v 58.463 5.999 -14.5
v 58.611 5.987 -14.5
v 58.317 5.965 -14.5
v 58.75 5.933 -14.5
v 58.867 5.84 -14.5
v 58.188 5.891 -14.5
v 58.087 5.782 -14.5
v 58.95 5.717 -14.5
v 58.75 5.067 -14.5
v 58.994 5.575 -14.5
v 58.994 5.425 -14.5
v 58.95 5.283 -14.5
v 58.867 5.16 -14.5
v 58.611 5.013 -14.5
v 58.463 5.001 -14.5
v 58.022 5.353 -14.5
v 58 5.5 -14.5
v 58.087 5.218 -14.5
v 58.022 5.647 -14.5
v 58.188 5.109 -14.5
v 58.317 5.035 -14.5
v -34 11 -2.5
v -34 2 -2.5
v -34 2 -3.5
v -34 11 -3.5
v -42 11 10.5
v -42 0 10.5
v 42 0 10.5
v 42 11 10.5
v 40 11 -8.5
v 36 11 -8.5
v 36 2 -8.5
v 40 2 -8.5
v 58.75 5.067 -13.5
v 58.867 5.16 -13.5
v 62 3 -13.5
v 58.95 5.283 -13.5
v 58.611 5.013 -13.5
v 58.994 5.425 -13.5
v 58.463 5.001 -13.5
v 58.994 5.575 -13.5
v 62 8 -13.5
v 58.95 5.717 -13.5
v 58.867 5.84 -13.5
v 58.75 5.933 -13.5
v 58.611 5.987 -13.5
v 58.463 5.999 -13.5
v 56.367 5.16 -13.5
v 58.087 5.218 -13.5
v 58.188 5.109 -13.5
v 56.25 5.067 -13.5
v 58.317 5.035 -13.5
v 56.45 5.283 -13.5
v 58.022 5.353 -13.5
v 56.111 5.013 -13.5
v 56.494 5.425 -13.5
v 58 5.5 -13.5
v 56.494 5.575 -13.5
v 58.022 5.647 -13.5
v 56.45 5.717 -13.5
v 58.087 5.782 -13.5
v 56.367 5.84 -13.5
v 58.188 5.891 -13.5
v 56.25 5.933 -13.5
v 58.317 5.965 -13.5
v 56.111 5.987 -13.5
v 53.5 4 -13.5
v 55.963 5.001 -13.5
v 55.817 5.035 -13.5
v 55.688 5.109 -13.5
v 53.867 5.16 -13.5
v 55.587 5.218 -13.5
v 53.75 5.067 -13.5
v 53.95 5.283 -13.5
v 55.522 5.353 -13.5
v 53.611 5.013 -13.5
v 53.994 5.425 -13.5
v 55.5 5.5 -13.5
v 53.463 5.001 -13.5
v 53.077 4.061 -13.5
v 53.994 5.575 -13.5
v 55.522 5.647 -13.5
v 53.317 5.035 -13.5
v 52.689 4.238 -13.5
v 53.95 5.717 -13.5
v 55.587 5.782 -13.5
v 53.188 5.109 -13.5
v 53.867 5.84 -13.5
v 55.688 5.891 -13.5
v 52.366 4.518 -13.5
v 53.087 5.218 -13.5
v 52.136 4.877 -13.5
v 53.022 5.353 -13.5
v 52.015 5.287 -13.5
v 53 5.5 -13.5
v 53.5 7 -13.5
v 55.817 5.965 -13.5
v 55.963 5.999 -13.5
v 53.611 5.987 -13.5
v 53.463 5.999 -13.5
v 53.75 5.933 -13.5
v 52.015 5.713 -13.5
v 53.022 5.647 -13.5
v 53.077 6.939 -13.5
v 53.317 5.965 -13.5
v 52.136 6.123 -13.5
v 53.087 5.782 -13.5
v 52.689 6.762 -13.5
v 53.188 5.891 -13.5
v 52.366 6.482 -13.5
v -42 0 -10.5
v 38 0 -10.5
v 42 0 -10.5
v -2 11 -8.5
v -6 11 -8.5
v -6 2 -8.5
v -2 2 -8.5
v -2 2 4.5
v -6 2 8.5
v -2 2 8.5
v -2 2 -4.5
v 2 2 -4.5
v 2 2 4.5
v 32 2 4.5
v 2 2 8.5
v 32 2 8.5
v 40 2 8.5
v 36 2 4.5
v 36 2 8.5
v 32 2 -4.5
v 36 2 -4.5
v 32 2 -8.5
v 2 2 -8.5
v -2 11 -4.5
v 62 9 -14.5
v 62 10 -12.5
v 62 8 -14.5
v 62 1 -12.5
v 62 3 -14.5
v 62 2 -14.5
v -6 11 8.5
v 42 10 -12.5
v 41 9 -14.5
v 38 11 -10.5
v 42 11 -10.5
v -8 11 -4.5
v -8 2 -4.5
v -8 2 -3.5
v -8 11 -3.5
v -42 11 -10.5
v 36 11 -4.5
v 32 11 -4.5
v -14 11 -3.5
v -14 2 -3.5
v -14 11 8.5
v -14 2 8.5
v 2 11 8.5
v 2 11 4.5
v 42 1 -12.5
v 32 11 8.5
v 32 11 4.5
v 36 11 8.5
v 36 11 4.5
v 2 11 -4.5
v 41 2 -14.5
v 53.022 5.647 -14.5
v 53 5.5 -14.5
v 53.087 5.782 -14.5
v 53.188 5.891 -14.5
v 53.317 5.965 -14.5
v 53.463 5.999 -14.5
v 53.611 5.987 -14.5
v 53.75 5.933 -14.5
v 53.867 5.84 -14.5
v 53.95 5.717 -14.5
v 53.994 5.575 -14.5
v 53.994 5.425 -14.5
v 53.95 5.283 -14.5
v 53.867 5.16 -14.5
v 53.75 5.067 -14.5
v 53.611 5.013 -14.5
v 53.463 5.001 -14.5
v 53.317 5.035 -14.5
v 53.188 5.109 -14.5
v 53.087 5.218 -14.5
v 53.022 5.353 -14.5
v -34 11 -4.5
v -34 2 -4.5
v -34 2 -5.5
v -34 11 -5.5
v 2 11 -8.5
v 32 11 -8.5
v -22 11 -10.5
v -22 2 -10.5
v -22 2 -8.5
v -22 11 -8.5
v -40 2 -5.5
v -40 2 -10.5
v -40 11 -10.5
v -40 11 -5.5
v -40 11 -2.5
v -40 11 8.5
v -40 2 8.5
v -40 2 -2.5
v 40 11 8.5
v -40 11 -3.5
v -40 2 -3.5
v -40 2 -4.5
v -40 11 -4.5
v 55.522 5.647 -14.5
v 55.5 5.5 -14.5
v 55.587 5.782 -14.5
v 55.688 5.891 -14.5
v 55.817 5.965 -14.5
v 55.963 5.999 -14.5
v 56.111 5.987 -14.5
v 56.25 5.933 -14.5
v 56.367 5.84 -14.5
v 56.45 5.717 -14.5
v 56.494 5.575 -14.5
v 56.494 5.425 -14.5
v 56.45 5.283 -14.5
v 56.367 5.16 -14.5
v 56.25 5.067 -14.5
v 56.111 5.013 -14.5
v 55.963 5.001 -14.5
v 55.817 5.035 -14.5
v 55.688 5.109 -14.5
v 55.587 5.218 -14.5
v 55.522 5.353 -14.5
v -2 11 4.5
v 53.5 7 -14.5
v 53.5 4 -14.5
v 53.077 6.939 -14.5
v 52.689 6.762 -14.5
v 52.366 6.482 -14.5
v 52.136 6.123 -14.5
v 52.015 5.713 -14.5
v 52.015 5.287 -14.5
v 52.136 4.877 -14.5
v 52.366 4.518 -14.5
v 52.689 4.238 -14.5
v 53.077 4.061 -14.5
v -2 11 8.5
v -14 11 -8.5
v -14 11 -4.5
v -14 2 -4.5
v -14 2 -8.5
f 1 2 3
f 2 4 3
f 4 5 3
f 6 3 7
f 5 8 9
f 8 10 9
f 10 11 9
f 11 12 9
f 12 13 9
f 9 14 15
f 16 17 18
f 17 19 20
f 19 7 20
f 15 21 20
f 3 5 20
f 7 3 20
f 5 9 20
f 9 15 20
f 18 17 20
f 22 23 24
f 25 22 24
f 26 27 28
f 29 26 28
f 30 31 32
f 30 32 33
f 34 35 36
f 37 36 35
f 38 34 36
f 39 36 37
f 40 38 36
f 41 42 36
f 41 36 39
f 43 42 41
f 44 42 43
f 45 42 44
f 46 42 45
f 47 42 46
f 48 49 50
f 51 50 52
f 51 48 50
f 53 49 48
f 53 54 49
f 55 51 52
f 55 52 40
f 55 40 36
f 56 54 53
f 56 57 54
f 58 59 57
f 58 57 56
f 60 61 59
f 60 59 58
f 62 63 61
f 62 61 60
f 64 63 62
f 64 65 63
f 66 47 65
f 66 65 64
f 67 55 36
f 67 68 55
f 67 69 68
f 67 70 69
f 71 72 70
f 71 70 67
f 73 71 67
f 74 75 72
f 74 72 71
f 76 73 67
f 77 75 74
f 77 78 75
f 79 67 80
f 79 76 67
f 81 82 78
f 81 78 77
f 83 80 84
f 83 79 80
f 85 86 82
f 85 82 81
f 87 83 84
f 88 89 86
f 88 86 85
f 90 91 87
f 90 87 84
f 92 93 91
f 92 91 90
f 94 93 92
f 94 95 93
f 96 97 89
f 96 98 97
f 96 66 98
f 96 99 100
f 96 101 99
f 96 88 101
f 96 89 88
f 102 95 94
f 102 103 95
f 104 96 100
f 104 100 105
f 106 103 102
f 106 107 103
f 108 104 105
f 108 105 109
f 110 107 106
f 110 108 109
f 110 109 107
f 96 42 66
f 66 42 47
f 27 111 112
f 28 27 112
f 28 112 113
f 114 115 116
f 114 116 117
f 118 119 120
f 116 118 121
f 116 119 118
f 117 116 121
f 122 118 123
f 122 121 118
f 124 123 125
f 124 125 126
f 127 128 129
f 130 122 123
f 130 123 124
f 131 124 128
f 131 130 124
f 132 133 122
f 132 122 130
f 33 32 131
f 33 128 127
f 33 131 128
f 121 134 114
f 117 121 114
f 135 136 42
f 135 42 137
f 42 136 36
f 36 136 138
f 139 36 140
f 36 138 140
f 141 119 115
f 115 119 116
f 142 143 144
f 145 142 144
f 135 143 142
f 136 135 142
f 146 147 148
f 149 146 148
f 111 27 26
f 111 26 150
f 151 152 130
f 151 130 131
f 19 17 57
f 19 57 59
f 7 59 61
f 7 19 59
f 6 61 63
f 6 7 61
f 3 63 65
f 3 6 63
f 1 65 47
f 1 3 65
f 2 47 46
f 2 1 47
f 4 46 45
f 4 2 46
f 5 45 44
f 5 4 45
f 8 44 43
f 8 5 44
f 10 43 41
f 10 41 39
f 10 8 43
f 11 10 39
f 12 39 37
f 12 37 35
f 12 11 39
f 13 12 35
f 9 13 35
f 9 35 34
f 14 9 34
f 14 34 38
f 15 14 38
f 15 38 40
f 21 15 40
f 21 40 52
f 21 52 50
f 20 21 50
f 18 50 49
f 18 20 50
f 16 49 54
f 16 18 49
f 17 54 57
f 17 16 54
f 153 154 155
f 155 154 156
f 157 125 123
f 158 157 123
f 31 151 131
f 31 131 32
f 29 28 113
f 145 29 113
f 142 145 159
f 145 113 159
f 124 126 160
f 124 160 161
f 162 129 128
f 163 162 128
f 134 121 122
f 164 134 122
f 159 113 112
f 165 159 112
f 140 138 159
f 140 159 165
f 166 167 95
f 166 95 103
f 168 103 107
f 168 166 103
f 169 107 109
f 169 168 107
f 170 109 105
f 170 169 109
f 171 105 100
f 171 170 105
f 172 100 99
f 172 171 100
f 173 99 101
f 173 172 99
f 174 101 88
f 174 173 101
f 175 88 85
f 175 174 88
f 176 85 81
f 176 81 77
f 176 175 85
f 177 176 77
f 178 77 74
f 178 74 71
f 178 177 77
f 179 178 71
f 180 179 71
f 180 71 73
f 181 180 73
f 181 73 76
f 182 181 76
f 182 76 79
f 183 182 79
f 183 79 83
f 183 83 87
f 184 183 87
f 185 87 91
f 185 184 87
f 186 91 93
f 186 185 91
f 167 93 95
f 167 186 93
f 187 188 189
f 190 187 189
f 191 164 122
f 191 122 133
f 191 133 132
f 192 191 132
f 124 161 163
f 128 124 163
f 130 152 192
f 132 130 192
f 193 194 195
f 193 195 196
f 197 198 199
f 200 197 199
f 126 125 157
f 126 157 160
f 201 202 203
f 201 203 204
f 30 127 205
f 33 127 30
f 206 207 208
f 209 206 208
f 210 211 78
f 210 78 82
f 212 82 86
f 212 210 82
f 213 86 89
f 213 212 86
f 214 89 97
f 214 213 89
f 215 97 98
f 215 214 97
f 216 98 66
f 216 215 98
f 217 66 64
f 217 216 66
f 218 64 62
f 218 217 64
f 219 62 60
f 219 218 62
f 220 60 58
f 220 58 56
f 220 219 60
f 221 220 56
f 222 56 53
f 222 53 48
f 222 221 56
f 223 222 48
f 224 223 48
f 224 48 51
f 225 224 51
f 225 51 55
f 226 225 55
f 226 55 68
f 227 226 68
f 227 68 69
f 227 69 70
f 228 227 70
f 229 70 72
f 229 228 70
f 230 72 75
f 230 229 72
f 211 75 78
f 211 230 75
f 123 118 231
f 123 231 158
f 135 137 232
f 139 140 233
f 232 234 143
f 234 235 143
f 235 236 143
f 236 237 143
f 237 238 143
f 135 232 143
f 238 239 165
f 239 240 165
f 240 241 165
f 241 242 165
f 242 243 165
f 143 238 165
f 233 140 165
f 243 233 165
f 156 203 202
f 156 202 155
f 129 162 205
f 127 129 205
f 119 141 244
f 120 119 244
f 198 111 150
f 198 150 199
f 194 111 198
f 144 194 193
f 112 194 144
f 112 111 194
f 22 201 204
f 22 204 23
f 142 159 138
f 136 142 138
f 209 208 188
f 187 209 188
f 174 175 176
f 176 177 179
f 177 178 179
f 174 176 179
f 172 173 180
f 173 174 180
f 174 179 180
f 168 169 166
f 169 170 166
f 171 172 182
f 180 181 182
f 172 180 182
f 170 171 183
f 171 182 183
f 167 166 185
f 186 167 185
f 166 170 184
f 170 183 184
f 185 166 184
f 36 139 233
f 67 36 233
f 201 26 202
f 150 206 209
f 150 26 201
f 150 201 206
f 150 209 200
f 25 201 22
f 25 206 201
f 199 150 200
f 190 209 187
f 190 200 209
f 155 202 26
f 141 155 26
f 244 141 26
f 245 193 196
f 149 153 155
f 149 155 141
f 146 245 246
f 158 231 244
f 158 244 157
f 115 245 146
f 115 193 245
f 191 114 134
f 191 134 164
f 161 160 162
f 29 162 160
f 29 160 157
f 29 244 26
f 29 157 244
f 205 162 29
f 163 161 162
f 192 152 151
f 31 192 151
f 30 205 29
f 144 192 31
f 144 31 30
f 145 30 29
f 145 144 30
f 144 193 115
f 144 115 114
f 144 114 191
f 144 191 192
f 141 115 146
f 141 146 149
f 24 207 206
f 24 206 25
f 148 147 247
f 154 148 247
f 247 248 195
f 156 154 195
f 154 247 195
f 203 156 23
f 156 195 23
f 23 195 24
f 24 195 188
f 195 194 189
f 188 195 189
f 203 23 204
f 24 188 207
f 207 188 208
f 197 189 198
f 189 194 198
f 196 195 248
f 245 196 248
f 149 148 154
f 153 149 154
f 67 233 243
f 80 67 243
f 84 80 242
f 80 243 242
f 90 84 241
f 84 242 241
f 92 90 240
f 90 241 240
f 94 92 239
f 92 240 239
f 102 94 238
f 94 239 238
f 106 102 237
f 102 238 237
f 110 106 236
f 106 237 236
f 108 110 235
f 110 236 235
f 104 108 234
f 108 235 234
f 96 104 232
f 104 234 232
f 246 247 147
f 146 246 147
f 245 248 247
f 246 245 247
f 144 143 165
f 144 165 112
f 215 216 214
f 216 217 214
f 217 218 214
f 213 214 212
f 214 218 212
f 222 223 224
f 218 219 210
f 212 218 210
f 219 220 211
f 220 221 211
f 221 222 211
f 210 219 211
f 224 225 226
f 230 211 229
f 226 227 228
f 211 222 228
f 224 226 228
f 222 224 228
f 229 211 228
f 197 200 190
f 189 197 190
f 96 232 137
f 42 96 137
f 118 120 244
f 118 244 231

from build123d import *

# Parameters (mm, degrees)
BOSS_EXTRUDE1_DEPTH = 2
SKETCH1_4_W         = 46
SKETCH1_4_H         = 17
BOSS_EXTRUDE2_DEPTH = 11
SKETCH2_W           = 6
SKETCH2_H           = 3
SKETCH2_H_2         = 11
CUT_EXTRUDE1_DEPTH  = 9
SKETCH3_W           = 18
SKETCH3_H           = 9
CUT_EXTRUDE2_DEPTH  = 2
SKETCH4_W           = 4
SKETCH4_H           = 4
BOSS_EXTRUDE3_DEPTH = 9
SKETCH5_R           = 0.5
CUT_EXTRUDE3_DEPTH  = 1
CUT_EXTRUDE4_DEPTH  = 24


with BuildPart() as part:
    # Sketch1 → Boss-Extrude1 (new body)
    with BuildSketch(Plane(origin=(0, 0, 0), x_dir=(1, 0, 0), z_dir=(0, 1, 0))):
        Polygon((-42, 10.5), (-42, -10.5), (42, -10.5), (42, 12.5), (62, 12.5), (62, 14.5), (41, 14.5), (38, 10.5), align=None)
    extrude(amount=BOSS_EXTRUDE1_DEPTH)

    # Sketch1<4> → Boss-Extrude2 (add)
    with BuildSketch(Plane(origin=(0, 0, 0), x_dir=(1, 0, 0), z_dir=(0, 1, 0))):
        Polygon((-42, 10.5), (-42, -10.5), (42, -10.5), (42, 12.5), (62, 12.5), (62, 14.5), (41, 14.5), (38, 10.5), align=None)
        Polygon((-14, 3.5), (-14, -8.5), (-34, -8.5), (-34, 3.5), (-40, 3.5), (-40, 4.5), (-34, 4.5), (-34, 8.5), (-14, 8.5), (-14, 4.5), (-8, 4.5), (-8, 3.5), align=None, mode=Mode.SUBTRACT)
        with Locations((17, 0)):
            Rectangle(SKETCH1_4_W, SKETCH1_4_H, mode=Mode.SUBTRACT)
    extrude(amount=BOSS_EXTRUDE2_DEPTH)

    # Sketch2 → Cut-Extrude1 (cut)
    with BuildSketch(Plane(origin=(0, 11, 0), x_dir=(1, 0, 0), z_dir=(0, 1, 0))):
        with Locations((-37, 7)):
            Rectangle(SKETCH2_W, SKETCH2_H)
        with Locations((-37, -3)):
            Rectangle(SKETCH2_W, SKETCH2_H_2)
    extrude(amount=-CUT_EXTRUDE1_DEPTH, mode=Mode.SUBTRACT)

    # Sketch3 → Cut-Extrude2 (cut)
    with BuildSketch(Plane(origin=(0, 0, -10.5), x_dir=(-1, 0, 0), z_dir=(0, 0, -1))):
        with Locations((31, 6.5)):
            Rectangle(SKETCH3_W, SKETCH3_H)
    extrude(amount=-CUT_EXTRUDE2_DEPTH, mode=Mode.SUBTRACT)

    # Sketch4 → Boss-Extrude3 (add)
    with BuildSketch(Plane(origin=(0, 2, 0), x_dir=(1, 0, 0), z_dir=(0, 1, 0))):
        with Locations((0, 6.5)):
            Rectangle(SKETCH4_W, SKETCH4_H)
        with Locations((0, -6.5)):
            Rectangle(SKETCH4_W, SKETCH4_H)
        with Locations((34, 6.5)):
            Rectangle(SKETCH4_W, SKETCH4_H)
        with Locations((34, -6.5)):
            Rectangle(SKETCH4_W, SKETCH4_H)
    extrude(amount=BOSS_EXTRUDE3_DEPTH)

    # Sketch5 → Cut-Extrude3 (cut)
    with BuildSketch(Plane(origin=(0, 0, -14.5), x_dir=(-1, 0, 0), z_dir=(0, 0, -1))):
        with BuildLine():
            Line((-62, 8), (-62, 3))
            Line((-62, 3), (-53.5, 4))
            ThreePointArc((-53.5, 4), (-52, 5.5), (-53.5, 7))
            Line((-53.5, 7), (-62, 8))
        make_face()
        with Locations((-58.5, 5.5)):
            Circle(SKETCH5_R, mode=Mode.SUBTRACT)
        with Locations((-56, 5.5)):
            Circle(SKETCH5_R, mode=Mode.SUBTRACT)
        with Locations((-53.5, 5.5)):
            Circle(SKETCH5_R, mode=Mode.SUBTRACT)
    extrude(amount=-CUT_EXTRUDE3_DEPTH, mode=Mode.SUBTRACT)

    # Sketch6 → Cut-Extrude4 (cut)
    with BuildSketch(Plane(origin=(62, 0, 0), x_dir=(0, 0, -1), z_dir=(1, 0, 0))):
        Polygon((10.5, 11), (14.5, 11), (14.5, 9), align=None)
        Polygon((10.5, 0), (14.5, 2), (14.5, 0), align=None)
    extrude(amount=-CUT_EXTRUDE4_DEPTH, mode=Mode.SUBTRACT)


solid = part.part
